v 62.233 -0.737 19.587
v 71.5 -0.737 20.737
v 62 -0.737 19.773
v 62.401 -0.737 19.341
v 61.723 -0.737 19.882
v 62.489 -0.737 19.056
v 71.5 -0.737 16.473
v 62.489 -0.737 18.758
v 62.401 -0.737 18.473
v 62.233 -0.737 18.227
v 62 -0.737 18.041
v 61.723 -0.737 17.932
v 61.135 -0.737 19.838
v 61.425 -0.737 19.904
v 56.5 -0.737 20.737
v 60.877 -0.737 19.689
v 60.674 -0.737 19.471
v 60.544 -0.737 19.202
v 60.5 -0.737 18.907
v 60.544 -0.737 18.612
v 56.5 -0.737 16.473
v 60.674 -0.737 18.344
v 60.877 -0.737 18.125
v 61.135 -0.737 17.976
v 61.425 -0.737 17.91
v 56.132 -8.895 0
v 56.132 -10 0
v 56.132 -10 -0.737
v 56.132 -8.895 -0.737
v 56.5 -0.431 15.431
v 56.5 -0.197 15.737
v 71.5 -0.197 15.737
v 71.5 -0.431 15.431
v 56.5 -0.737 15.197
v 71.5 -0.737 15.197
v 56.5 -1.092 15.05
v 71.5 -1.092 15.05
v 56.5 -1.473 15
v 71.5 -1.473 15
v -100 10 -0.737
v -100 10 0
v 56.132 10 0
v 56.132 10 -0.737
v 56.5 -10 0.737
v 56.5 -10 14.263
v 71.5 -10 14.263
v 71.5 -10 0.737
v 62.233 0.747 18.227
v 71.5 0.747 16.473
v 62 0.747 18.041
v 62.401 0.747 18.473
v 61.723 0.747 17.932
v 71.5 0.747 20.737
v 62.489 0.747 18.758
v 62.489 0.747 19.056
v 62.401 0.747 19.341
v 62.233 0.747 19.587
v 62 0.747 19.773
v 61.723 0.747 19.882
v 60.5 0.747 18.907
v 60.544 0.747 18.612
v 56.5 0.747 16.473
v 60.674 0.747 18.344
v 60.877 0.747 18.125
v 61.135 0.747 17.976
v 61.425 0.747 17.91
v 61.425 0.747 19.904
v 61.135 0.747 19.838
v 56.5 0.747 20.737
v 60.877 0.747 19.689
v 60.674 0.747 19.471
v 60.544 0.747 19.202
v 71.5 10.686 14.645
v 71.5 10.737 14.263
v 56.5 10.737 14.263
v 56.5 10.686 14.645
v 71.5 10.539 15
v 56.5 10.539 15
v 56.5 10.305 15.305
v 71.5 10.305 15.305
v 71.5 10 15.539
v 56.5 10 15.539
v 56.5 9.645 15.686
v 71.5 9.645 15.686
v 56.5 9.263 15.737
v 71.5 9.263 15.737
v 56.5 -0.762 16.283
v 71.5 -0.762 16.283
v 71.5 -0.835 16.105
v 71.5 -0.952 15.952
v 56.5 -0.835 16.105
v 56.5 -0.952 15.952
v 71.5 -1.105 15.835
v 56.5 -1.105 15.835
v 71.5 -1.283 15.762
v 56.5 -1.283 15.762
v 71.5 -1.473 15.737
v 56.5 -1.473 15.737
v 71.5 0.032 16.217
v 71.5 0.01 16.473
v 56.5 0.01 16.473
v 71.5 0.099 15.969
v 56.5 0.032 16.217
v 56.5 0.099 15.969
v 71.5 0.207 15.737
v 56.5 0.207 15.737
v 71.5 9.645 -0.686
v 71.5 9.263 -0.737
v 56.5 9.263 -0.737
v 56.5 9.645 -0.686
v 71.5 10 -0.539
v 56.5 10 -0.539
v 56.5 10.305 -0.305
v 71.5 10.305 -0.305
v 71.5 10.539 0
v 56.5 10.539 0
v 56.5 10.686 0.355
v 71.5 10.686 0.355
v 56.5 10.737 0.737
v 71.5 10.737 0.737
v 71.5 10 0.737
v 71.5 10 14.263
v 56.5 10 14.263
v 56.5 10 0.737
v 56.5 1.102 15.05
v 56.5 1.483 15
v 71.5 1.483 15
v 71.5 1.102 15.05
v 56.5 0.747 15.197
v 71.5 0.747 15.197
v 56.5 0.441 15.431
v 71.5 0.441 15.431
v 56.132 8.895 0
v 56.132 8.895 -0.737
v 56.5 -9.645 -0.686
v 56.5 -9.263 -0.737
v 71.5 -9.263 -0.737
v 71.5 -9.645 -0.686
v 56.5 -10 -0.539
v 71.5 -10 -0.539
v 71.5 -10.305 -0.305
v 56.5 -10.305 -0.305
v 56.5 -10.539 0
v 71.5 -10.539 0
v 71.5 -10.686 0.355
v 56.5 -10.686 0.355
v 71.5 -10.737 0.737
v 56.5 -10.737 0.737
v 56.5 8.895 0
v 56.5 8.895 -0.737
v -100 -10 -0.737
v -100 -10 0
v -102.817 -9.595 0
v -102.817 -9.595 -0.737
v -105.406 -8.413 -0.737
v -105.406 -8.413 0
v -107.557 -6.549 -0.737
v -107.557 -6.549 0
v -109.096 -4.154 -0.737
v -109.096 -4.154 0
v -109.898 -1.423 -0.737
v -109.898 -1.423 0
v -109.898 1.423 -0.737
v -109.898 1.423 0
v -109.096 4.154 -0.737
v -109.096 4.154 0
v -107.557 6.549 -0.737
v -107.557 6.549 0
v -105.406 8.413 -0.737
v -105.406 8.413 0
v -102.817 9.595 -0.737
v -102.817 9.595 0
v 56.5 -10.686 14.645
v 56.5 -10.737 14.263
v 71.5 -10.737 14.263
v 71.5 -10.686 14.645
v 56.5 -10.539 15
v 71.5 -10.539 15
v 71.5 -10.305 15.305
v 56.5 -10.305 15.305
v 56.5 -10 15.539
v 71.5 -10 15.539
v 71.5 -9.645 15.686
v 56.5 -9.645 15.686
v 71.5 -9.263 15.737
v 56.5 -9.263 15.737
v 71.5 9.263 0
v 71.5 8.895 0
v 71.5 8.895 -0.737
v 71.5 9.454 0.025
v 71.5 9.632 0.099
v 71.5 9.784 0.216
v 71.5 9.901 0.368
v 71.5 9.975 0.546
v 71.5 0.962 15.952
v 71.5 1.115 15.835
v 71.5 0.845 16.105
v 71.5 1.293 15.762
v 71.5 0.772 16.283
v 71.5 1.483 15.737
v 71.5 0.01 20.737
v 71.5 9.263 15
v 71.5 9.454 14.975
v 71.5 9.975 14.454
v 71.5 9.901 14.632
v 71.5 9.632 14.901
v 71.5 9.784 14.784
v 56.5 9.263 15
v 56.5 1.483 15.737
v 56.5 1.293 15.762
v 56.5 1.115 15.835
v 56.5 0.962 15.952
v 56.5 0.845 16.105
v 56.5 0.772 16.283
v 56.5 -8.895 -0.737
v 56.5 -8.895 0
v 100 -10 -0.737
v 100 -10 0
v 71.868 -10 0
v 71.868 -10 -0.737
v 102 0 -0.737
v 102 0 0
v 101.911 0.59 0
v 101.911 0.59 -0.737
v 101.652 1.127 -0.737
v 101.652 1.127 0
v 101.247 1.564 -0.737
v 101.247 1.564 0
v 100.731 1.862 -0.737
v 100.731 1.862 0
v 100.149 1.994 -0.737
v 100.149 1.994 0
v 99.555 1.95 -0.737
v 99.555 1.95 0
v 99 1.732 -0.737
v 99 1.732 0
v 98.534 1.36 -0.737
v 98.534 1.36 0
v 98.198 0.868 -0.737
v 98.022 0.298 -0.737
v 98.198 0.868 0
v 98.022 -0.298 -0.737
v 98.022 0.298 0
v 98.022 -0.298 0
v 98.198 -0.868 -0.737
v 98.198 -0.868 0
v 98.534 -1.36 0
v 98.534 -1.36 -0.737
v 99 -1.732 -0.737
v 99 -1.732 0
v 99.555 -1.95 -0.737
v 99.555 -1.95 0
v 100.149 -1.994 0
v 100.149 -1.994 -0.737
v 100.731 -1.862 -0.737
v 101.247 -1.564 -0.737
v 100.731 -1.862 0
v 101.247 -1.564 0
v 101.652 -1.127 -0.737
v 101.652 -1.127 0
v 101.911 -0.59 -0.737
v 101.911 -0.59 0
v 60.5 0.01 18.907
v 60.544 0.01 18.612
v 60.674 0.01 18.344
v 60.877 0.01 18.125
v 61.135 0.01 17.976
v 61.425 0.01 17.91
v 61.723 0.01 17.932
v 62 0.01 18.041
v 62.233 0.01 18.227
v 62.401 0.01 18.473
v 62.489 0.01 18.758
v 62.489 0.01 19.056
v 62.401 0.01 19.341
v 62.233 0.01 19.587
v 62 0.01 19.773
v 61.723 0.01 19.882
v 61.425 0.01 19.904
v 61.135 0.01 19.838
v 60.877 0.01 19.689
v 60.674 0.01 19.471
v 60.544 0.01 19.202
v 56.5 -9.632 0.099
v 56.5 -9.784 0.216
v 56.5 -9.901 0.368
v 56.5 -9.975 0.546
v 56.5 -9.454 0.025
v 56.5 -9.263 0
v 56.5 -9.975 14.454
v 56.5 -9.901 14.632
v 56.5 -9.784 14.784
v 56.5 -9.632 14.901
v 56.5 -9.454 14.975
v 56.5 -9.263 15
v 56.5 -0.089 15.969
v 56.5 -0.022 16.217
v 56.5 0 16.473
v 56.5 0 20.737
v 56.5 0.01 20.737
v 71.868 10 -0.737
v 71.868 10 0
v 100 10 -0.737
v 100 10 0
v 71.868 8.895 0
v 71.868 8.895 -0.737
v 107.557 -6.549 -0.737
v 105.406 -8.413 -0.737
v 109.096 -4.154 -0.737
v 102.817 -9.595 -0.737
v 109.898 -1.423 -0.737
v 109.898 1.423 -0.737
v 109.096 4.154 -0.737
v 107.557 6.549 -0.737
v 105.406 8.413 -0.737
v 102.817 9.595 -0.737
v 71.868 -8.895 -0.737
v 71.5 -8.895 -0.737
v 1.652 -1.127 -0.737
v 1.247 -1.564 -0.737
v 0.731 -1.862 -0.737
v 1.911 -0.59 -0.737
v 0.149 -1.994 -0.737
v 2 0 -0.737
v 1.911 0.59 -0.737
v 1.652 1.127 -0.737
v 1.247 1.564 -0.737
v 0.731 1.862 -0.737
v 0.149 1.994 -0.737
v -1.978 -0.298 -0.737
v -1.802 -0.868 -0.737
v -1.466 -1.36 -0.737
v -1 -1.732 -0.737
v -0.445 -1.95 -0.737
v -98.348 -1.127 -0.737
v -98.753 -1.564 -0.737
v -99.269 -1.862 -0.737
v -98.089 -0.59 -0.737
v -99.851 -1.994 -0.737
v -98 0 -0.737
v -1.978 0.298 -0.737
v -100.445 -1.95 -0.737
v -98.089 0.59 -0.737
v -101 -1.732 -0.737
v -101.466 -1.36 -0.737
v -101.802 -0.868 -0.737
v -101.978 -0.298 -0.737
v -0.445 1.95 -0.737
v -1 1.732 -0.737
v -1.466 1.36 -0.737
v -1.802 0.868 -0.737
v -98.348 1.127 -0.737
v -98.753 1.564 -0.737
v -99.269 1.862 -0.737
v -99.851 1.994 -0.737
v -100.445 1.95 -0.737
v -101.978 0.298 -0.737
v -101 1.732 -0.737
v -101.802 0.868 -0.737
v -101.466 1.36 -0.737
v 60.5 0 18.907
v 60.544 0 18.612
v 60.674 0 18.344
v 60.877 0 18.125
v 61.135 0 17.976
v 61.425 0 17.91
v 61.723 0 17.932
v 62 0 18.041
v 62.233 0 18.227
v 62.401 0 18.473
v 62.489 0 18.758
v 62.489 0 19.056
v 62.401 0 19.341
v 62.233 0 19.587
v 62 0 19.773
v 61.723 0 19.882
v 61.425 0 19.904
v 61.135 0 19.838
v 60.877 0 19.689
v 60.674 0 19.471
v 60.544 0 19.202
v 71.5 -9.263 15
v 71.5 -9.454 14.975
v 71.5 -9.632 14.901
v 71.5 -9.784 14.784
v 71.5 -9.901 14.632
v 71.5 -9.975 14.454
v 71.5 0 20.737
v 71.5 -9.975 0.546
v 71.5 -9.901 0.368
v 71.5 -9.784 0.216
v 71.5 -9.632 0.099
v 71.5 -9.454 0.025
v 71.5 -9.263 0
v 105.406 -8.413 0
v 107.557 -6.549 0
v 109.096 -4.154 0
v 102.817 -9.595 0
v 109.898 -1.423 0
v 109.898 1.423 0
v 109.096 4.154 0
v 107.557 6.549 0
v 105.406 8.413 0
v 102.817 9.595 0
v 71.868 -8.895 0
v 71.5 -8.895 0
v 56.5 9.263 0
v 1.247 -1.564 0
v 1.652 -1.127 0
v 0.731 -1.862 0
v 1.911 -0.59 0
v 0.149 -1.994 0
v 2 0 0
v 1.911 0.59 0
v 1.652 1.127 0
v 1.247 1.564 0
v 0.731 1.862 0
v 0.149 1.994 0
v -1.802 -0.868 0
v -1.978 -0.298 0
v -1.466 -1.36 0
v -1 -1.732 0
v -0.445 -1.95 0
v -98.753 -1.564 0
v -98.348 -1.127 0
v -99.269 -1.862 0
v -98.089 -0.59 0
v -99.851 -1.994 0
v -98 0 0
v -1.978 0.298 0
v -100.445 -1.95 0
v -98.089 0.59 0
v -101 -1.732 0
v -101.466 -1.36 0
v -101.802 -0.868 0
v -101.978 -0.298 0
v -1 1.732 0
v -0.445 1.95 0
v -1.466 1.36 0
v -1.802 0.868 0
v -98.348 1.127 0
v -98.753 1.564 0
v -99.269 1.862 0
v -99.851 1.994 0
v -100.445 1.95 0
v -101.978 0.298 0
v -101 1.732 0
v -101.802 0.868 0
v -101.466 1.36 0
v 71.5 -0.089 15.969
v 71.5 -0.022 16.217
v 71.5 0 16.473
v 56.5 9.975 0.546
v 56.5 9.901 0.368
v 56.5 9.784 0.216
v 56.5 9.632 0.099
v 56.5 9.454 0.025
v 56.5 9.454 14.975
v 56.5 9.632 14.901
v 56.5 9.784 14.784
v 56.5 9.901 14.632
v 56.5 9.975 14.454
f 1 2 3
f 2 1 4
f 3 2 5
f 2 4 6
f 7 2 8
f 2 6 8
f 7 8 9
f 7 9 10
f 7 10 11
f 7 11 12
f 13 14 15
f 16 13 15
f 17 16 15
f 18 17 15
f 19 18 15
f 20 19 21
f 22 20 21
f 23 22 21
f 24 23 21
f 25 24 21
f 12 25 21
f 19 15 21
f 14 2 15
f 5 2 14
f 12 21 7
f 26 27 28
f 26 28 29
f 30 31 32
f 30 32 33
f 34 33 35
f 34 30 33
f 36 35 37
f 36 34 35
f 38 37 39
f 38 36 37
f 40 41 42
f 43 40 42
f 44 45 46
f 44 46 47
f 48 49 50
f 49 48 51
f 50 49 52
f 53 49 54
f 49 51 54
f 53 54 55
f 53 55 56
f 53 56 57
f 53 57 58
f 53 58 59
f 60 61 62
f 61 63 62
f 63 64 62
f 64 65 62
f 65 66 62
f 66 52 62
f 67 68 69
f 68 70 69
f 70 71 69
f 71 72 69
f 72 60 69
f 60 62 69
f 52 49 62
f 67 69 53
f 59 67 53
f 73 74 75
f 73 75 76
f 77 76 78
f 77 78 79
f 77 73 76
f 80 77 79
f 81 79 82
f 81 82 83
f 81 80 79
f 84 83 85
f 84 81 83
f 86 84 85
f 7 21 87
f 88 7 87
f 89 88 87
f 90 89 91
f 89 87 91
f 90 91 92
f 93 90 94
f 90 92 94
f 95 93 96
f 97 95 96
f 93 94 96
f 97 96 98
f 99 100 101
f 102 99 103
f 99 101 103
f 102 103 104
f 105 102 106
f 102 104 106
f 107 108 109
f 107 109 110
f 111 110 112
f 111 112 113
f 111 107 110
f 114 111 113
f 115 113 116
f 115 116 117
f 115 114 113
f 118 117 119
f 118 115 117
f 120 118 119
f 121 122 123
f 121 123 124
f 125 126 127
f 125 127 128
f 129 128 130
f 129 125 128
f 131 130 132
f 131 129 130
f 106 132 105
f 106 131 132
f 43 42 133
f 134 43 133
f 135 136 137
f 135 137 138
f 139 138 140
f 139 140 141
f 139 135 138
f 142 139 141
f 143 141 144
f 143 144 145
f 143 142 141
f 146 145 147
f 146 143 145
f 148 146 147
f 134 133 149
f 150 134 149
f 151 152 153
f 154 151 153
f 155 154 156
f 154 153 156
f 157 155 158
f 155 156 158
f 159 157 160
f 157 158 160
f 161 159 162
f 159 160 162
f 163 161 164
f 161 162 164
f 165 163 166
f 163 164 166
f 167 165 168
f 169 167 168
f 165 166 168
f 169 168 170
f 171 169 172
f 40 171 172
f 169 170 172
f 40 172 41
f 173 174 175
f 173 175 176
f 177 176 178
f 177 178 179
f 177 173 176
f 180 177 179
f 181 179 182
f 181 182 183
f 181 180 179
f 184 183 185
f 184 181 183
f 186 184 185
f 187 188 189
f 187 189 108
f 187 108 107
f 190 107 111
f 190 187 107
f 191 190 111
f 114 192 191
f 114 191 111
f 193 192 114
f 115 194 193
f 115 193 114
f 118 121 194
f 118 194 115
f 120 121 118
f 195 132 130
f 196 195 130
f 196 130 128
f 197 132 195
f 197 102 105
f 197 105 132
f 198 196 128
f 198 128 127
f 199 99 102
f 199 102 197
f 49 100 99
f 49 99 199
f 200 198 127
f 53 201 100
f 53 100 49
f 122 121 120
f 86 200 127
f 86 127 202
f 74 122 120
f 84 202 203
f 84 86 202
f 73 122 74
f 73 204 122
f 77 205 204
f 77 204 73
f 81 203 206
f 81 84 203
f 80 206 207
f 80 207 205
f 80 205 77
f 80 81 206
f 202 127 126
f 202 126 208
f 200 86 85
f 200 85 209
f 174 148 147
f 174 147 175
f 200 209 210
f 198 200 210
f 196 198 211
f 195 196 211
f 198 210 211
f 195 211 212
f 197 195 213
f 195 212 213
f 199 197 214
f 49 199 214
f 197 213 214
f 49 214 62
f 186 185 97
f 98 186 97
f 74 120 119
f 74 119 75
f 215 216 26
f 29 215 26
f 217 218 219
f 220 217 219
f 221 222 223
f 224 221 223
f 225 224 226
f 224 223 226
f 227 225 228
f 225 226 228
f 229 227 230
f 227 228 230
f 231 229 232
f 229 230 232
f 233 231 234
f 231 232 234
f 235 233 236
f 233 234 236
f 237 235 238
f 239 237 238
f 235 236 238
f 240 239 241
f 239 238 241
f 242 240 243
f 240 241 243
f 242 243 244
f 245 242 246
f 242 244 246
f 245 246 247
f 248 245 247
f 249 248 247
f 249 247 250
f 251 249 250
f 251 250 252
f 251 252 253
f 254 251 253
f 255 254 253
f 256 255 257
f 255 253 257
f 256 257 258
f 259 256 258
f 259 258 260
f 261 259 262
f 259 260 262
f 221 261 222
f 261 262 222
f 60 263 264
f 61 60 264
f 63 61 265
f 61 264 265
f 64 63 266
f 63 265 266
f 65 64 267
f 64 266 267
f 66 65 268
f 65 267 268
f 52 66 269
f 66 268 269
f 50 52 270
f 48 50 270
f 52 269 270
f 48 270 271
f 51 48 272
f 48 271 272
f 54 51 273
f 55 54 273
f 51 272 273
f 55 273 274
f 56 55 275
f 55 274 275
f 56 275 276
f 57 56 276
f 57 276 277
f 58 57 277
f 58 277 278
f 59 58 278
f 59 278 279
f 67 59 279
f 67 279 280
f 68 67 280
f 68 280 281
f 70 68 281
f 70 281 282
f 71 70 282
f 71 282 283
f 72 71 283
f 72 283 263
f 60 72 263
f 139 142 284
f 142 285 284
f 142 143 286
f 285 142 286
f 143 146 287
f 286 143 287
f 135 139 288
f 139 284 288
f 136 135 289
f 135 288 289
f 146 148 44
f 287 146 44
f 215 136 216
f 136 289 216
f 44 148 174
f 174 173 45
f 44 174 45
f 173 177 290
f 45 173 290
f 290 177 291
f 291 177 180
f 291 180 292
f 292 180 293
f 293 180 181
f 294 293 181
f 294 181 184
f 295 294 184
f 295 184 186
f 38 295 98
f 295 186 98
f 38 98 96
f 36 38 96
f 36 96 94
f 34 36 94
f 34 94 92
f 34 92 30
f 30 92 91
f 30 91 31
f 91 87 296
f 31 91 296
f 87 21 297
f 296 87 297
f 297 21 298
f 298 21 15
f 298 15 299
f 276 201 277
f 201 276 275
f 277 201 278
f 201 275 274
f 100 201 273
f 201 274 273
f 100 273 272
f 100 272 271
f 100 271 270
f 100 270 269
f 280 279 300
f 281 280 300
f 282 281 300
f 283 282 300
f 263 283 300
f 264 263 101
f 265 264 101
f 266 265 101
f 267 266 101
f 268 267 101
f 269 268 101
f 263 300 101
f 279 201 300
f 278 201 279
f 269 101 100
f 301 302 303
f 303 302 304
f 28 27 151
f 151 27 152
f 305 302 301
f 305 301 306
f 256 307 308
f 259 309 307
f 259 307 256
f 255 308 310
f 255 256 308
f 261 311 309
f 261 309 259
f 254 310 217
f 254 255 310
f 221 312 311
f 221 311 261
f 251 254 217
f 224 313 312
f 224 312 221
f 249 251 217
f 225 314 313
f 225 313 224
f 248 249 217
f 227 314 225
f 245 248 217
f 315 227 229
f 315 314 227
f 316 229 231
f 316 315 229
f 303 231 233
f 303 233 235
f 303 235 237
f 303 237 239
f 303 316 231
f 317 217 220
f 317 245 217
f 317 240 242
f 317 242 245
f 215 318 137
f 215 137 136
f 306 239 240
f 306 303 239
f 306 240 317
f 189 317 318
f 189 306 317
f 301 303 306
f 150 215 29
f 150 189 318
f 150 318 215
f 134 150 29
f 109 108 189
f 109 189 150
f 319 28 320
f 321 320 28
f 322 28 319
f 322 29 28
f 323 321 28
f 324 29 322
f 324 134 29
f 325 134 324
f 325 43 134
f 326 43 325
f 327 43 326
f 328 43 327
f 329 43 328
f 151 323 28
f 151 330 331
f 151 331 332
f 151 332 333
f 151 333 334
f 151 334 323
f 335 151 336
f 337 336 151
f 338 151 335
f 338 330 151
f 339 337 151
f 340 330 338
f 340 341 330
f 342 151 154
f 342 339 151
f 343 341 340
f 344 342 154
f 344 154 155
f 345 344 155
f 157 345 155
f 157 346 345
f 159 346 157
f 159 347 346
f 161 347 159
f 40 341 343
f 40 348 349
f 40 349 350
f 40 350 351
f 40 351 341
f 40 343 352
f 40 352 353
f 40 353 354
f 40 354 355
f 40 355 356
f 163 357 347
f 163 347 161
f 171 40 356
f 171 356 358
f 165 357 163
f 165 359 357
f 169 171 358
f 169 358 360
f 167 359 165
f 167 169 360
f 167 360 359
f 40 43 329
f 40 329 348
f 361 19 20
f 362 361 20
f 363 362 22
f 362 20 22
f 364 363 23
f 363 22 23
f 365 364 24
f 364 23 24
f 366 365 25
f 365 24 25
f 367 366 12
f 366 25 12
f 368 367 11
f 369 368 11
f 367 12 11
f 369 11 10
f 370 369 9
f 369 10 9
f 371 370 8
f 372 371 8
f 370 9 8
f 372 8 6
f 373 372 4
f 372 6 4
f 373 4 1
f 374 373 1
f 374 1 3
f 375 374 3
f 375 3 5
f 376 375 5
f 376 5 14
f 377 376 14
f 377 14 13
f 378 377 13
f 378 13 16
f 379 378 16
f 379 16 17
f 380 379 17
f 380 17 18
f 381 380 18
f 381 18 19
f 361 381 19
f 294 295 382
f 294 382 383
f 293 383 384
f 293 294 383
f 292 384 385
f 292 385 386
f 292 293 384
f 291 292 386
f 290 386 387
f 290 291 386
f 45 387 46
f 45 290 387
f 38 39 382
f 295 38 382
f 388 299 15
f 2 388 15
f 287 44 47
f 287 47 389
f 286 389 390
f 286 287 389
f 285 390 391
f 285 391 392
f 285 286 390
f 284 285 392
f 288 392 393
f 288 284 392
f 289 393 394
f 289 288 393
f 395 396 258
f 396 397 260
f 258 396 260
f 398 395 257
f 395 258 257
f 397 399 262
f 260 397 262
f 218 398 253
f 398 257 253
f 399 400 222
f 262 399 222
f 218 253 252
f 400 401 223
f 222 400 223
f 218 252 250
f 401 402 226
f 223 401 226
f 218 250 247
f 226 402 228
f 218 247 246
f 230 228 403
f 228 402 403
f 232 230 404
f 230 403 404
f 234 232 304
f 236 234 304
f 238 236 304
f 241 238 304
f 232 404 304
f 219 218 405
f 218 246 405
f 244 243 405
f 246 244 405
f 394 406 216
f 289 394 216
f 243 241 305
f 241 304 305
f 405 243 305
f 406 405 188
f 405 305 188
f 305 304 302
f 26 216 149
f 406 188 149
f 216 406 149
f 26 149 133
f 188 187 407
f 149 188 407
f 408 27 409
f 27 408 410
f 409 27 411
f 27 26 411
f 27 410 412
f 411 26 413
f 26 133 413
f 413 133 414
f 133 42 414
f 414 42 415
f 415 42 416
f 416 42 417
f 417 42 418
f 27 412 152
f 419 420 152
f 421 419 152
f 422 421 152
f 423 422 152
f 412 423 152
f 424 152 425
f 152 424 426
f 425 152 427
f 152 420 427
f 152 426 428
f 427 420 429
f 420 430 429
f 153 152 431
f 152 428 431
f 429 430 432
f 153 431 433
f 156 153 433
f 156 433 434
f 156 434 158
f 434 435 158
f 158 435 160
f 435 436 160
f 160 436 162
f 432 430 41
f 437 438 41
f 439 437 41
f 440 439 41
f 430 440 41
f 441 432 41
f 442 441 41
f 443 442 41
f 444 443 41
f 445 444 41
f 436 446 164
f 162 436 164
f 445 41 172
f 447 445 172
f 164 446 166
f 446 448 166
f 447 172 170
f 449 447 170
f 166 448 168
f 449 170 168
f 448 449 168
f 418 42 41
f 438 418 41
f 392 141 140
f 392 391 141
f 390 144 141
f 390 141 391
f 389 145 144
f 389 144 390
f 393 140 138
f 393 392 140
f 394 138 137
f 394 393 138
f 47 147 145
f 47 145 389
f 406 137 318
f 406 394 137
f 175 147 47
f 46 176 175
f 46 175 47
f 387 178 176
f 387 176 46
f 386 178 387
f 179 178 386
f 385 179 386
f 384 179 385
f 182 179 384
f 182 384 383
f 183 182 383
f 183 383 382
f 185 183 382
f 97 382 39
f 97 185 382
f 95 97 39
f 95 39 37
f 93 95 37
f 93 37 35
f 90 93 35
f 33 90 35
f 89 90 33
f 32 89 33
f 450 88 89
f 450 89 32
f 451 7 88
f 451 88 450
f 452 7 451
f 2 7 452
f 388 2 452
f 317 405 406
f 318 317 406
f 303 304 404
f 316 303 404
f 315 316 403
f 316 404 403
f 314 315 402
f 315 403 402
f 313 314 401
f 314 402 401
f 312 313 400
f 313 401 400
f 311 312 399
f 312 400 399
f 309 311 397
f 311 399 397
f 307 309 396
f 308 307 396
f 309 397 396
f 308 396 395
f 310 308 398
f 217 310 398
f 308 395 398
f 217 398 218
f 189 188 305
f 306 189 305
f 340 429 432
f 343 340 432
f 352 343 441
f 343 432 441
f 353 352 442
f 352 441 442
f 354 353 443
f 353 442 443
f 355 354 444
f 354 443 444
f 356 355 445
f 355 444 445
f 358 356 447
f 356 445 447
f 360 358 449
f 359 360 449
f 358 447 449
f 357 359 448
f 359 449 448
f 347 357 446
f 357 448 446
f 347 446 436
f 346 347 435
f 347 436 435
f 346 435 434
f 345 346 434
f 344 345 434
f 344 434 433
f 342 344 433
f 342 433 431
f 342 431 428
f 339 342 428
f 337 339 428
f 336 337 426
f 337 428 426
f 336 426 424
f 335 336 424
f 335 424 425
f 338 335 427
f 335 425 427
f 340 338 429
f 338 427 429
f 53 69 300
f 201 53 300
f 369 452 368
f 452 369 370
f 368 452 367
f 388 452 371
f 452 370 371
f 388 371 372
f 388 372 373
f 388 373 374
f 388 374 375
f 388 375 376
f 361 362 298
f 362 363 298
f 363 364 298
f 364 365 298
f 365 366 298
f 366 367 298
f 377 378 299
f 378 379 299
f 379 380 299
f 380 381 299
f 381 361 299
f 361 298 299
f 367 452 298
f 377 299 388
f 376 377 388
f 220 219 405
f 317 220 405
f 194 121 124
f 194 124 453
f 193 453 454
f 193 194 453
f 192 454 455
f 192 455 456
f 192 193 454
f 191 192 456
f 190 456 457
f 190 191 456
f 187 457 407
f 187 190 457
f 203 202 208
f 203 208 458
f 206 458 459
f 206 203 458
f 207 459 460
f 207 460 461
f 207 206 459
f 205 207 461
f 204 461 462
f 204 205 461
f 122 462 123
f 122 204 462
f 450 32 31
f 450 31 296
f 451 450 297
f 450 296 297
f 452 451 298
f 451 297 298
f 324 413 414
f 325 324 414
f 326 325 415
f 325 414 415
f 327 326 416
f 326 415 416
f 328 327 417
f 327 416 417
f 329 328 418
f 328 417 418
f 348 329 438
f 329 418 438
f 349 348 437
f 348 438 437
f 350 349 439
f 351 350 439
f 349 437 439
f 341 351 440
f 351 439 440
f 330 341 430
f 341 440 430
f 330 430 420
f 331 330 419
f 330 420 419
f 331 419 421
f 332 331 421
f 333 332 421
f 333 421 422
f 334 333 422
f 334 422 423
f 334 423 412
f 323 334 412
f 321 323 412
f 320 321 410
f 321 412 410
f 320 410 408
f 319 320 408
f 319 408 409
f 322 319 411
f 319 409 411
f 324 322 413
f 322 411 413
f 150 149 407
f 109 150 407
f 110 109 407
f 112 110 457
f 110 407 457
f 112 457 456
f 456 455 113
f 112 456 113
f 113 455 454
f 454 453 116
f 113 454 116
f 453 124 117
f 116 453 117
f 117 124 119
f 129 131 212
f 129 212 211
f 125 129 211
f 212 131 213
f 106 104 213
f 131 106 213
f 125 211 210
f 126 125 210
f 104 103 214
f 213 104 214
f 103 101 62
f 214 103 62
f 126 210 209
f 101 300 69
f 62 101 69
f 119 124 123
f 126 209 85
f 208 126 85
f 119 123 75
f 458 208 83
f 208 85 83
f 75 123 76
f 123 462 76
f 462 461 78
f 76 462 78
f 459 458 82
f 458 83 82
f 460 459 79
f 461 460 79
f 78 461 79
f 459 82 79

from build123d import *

# Parameters (mm, degrees)
SKETCH2_R                     = 2
BASE_FLANGE1_DEPTH            = 0.7366
EDGE_FLANGE1_STRIP_W          = 4.4196
EDGE_FLANGE1_STRIP_H          = 0.7366
EDGE_FLANGE1_STRIP_CUT_DEPTH  = 15
EDGE_FLANGE1_RELIEF_W         = 4.7879
EDGE_FLANGE1_RELIEF_H         = 0.3683
EDGE_FLANGE1_RELIEF_CUT_DEPTH = 0.7366
EDGE_FLANGE1_DEPTH            = 15
EDGE_FLANGE4_STRIP_W          = 4.4196
EDGE_FLANGE4_STRIP_H          = 0.7366
EDGE_FLANGE4_STRIP_CUT_DEPTH  = 15
EDGE_FLANGE4_RELIEF_W         = 4.7879
EDGE_FLANGE4_RELIEF_H         = 0.3683
EDGE_FLANGE4_RELIEF_CUT_DEPTH = 0.7366
EDGE_FLANGE4_DEPTH            = 15
EDGE_FLANGE5_STRIP_W          = 4.4196
EDGE_FLANGE5_STRIP_H          = 0.7366
EDGE_FLANGE5_STRIP_CUT_DEPTH  = 15
EDGE_FLANGE5_DEPTH            = 15
EDGE_FLANGE6_STRIP_W          = 4.4196
EDGE_FLANGE6_STRIP_H          = 0.7366
EDGE_FLANGE6_STRIP_CUT_DEPTH  = 15
EDGE_FLANGE6_DEPTH            = 15
EDGE_FLANGE7_START            = 56.5
EDGE_FLANGE7_DEPTH            = 15
EDGE_FLANGE7_2_DEPTH          = 15
EDGE_FLANGE8_START            = 56.5
EDGE_FLANGE8_DEPTH            = 15
EDGE_FLANGE8_2_DEPTH          = 15
F_2_0_2_DIAMETER_HOLE4_D      = 2


# Read off the part's stored shape, not the designer's step: Edge-Flange7, Edge-Flange8
# Sheet-metal steps are written as plain solids
with BuildPart() as part:
    # Sketch2 → Base-Flange1 (new body)
    with BuildSketch(Plane.XY):
        with BuildLine():
            Line((-100, 10), (100, 10))
            ThreePointArc((100, 10), (110, 0), (100, -10))
            Line((100, -10), (-100, -10))
            ThreePointArc((-100, -10), (-110, 0), (-100, 10))
        make_face()
        with Locations((100, 0)):
            Circle(SKETCH2_R, mode=Mode.SUBTRACT)
        Circle(SKETCH2_R, mode=Mode.SUBTRACT)
        with Locations((-100, 0)):
            Circle(SKETCH2_R, mode=Mode.SUBTRACT)
    extrude(amount=-BASE_FLANGE1_DEPTH)

    # Edge-Flange1 strip (across the edge) → Edge-Flange1 strip cut (cut)
    with BuildSketch(Plane(origin=(71.5, 10, 0), x_dir=(0, -1, 0), z_dir=(-1, 0, 0))):
        with Locations((-1.4732, -0.3683)):
            Rectangle(EDGE_FLANGE1_STRIP_W, EDGE_FLANGE1_STRIP_H)
    extrude(amount=EDGE_FLANGE1_STRIP_CUT_DEPTH, mode=Mode.SUBTRACT)

    # Edge-Flange1 relief (on the sheet) → Edge-Flange1 relief cut (cut)
    with BuildSketch(Plane(origin=(71.5, 9.2634, 0), x_dir=(0, -1, 0), z_dir=(0, 0, 1))):
        with Locations((-2.02565, 0.18415)):
            Rectangle(EDGE_FLANGE1_RELIEF_W, EDGE_FLANGE1_RELIEF_H)
        with Locations((-2.02565, -15.18415)):
            Rectangle(EDGE_FLANGE1_RELIEF_W, EDGE_FLANGE1_RELIEF_H)
    extrude(amount=-EDGE_FLANGE1_RELIEF_CUT_DEPTH, mode=Mode.SUBTRACT)

    # Edge-Flange1 section (across the edge) → Edge-Flange1 (add)
    with BuildSketch(Plane(origin=(71.5, 10, 0), x_dir=(0, -1, 0), z_dir=(-1, 0, 0))):
        with BuildLine():
            Line((-0.7366, 0.7366), (-0.7366, 15))
            Line((-0.7366, 15), (0, 15))
            Line((0, 15), (0, 0.7366))
            ThreePointArc((0, 0.7366), (0.215745145, 0.215745145), (0.7366, 0))
            Line((0.7366, 0), (0.7366, -0.7366))
            ThreePointArc((0.7366, -0.7366), (-0.30510971, -0.30510971), (-0.7366, 0.7366))
        make_face()
    extrude(amount=EDGE_FLANGE1_DEPTH)

    # Edge-Flange4 strip (across the edge) → Edge-Flange4 strip cut (cut)
    with BuildSketch(Plane(origin=(56.5, -10, 0), x_dir=(0, 1, 0), z_dir=(1, 0, 0))):
        with Locations((-1.4732, -0.3683)):
            Rectangle(EDGE_FLANGE4_STRIP_W, EDGE_FLANGE4_STRIP_H)
    extrude(amount=EDGE_FLANGE4_STRIP_CUT_DEPTH, mode=Mode.SUBTRACT)

    # Edge-Flange4 relief (on the sheet) → Edge-Flange4 relief cut (cut)
    with BuildSketch(Plane(origin=(56.5, -9.2634, 0), x_dir=(0, 1, 0), z_dir=(0, 0, 1))):
        with Locations((-2.02565, 0.18415)):
            Rectangle(EDGE_FLANGE4_RELIEF_W, EDGE_FLANGE4_RELIEF_H)
        with Locations((-2.02565, -15.18415)):
            Rectangle(EDGE_FLANGE4_RELIEF_W, EDGE_FLANGE4_RELIEF_H)
    extrude(amount=-EDGE_FLANGE4_RELIEF_CUT_DEPTH, mode=Mode.SUBTRACT)

    # Edge-Flange4 section (across the edge) → Edge-Flange4 (add)
    with BuildSketch(Plane(origin=(56.5, -10, 0), x_dir=(0, 1, 0), z_dir=(1, 0, 0))):
        with BuildLine():
            Line((-0.7366, 0.7366), (-0.7366, 15))
            Line((-0.7366, 15), (0, 15))
            Line((0, 15), (0, 0.7366))
            ThreePointArc((0, 0.7366), (0.215745145, 0.215745145), (0.7366, 0))
            Line((0.7366, 0), (0.7366, -0.7366))
            ThreePointArc((0.7366, -0.7366), (-0.30510971, -0.30510971), (-0.7366, 0.7366))
        make_face()
    extrude(amount=EDGE_FLANGE4_DEPTH)

    # Edge-Flange5 strip (across the edge) → Edge-Flange5 strip cut (cut)
    with BuildSketch(Plane(origin=(71.5, 10, 15), x_dir=(0, 0, -1), z_dir=(-1, 0, 0))):
        with Locations((-1.4732, -0.3683)):
            Rectangle(EDGE_FLANGE5_STRIP_W, EDGE_FLANGE5_STRIP_H)
    extrude(amount=EDGE_FLANGE5_STRIP_CUT_DEPTH, mode=Mode.SUBTRACT)

    # Edge-Flange5 section (across the edge) → Edge-Flange5 (add)
    with BuildSketch(Plane(origin=(71.5, 10, 15), x_dir=(0, 0, -1), z_dir=(-1, 0, 0))):
        with BuildLine():
            Line((-0.7366, 0.7366), (-0.7366, 9.99))
            Line((-0.7366, 9.99), (0, 9.99))
            Line((0, 9.99), (0, 0.7366))
            ThreePointArc((0, 0.7366), (0.215745145, 0.215745145), (0.7366, 0))
            Line((0.7366, 0), (0.7366, -0.7366))
            ThreePointArc((0.7366, -0.7366), (-0.30510971, -0.30510971), (-0.7366, 0.7366))
        make_face()
    extrude(amount=EDGE_FLANGE5_DEPTH)

    # Edge-Flange6 strip (across the edge) → Edge-Flange6 strip cut (cut)
    with BuildSketch(Plane(origin=(56.5, -10, 15), x_dir=(0, 0, -1), z_dir=(1, 0, 0))):
        with Locations((-1.4732, -0.3683)):
            Rectangle(EDGE_FLANGE6_STRIP_W, EDGE_FLANGE6_STRIP_H)
    extrude(amount=EDGE_FLANGE6_STRIP_CUT_DEPTH, mode=Mode.SUBTRACT)

    # Edge-Flange6 section (across the edge) → Edge-Flange6 (add)
    with BuildSketch(Plane(origin=(56.5, -10, 15), x_dir=(0, 0, -1), z_dir=(1, 0, 0))):
        with BuildLine():
            Line((-0.7366, 0.7366), (-0.7366, 10))
            Line((-0.7366, 10), (0, 10))
            Line((0, 10), (0, 0.7366))
            ThreePointArc((0, 0.7366), (0.215745145, 0.215745145), (0.7366, 0))
            Line((0.7366, 0), (0.7366, -0.7366))
            ThreePointArc((0.7366, -0.7366), (-0.30510971, -0.30510971), (-0.7366, 0.7366))
        make_face()
    extrude(amount=EDGE_FLANGE6_DEPTH)

    # Edge-Flange7 outline → Edge-Flange7 (cut)
    with BuildSketch(Plane.YZ.offset(EDGE_FLANGE7_START)):
        with BuildLine():
            Line((0, 15.7366), (-0.197371375, 15.7366))
            ThreePointArc((-0.197371375, 15.7366), (-0.7366, 15.197371375), (-1.4732, 15))
            Line((-1.4732, 15), (0, 15))
            Line((0, 15), (0, 15.7366))
        make_face()
    extrude(amount=EDGE_FLANGE7_DEPTH, mode=Mode.SUBTRACT)

    # Edge-Flange7 2 outline → Edge-Flange7 2 (add)
    with BuildSketch(Plane.YZ.offset(EDGE_FLANGE7_START)):
        with BuildLine():
            ThreePointArc((-0.197371375, 15.7366), (-0.050198073, 16.091907783), (0, 16.4732))
            Line((0, 16.4732), (0, 20.7366))
            Line((0, 20.7366), (-0.7366, 20.7366))
            Line((-0.7366, 20.7366), (-0.7366, 16.4732))
            ThreePointArc((-0.7366, 16.4732), (-0.952345145, 15.952345145), (-1.4732, 15.7366))
            Line((-1.4732, 15.7366), (-0.197371375, 15.7366))
        make_face()
    extrude(amount=EDGE_FLANGE7_2_DEPTH)

    # Edge-Flange8 outline → Edge-Flange8 (cut)
    with BuildSketch(Plane.YZ.offset(EDGE_FLANGE8_START)):
        with BuildLine():
            ThreePointArc((1.4832, 15), (0.7466, 15.197371375), (0.207371375, 15.7366))
            Line((0.207371375, 15.7366), (0.01, 15.7366))
            Line((0.01, 15.7366), (0.01, 15))
            Line((0.01, 15), (1.4832, 15))
        make_face()
    extrude(amount=EDGE_FLANGE8_DEPTH, mode=Mode.SUBTRACT)

    # Edge-Flange8 2 outline → Edge-Flange8 2 (add)
    with BuildSketch(Plane.YZ.offset(EDGE_FLANGE8_START)):
        with BuildLine():
            Line((0.7466, 20.7366), (0.01, 20.7366))
            Line((0.01, 20.7366), (0.01, 16.4732))
            ThreePointArc((0.01, 16.4732), (0.060198073, 16.091907783), (0.207371375, 15.7366))
            Line((0.207371375, 15.7366), (1.4832, 15.7366))
            ThreePointArc((1.4832, 15.7366), (0.962345145, 15.952345145), (0.7466, 16.4732))
            Line((0.7466, 16.4732), (0.7466, 20.7366))
        make_face()
    extrude(amount=EDGE_FLANGE8_2_DEPTH)

    # Ø2.0 (2) Diameter Hole4 (through all)
    with Locations(Plane(origin=(0, 0.7466, 0), x_dir=(1, 0, 0), z_dir=(0, 1, 0))):
        with Locations((61.5, -18.907246823)):
            Hole(F_2_0_2_DIAMETER_HOLE4_D / 2)


solid = part.part
